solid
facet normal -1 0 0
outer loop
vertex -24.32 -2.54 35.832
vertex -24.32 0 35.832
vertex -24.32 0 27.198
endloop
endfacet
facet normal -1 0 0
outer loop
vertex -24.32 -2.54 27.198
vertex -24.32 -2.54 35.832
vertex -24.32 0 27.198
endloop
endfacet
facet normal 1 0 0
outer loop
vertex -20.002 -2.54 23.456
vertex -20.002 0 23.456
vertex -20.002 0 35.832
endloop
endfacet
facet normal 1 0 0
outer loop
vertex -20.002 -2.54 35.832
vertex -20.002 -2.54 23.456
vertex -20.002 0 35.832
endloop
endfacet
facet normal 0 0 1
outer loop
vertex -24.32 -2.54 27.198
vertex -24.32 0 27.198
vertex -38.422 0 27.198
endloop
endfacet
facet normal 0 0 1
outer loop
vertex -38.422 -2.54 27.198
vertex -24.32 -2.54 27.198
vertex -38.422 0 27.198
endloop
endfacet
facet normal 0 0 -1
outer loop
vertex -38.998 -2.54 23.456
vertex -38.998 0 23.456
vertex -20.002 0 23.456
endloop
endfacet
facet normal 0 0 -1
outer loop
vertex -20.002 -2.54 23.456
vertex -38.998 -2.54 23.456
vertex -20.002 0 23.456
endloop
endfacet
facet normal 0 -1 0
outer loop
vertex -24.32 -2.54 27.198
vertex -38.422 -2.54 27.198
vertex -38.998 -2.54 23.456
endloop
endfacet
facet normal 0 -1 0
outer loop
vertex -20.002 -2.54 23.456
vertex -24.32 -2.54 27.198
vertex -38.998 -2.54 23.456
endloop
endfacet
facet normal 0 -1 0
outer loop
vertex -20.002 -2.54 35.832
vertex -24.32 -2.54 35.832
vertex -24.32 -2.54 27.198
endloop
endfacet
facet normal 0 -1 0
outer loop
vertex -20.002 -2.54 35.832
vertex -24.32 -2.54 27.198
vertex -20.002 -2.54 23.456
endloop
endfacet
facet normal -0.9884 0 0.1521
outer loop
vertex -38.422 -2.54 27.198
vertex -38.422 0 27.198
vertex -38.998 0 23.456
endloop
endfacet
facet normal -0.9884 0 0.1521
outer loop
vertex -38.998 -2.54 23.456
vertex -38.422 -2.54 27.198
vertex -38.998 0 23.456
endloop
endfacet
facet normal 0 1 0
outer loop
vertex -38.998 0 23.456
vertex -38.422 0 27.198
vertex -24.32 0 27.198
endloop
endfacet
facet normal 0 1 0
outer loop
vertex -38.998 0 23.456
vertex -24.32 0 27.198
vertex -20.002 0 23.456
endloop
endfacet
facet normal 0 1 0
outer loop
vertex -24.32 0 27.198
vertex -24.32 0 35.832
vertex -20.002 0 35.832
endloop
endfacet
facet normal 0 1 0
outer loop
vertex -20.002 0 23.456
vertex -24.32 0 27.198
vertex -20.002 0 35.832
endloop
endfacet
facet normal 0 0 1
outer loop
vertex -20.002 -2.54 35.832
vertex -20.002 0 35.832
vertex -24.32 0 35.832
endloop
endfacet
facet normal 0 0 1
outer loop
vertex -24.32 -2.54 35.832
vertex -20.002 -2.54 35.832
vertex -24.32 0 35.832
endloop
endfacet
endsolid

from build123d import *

# Parameters (mm, degrees)
F1_DEPTH = 2.54
F2_R     = 2.6712032827
F3_DEPTH = 2.54


# Not quite as in the source:
# - the program builds the solid bodies; features that only make, move or delete a surface that nothing else refers to are left out


with BuildPart() as f1:
    # F0 (on Front) → F1 (new body)
    with BuildSketch(Plane.XZ):
        Polygon((-38.4220704436, 27.1976441145), (-38.9976799488, 23.4561692923), (-20.0024992228, 23.4561692923), (-20.0024992228, 35.8318164945), (-24.3195872754, 35.8318164945), (-24.3195872754, 31.2269236892), (-24.3195872754, 27.1976441145), align=None)
    extrude(amount=F1_DEPTH)

    # F2 (on Right) → F3 (cut)
    with BuildSketch(Plane.YZ):
        with Locations((0, 48.1319762766)):
            Circle(F2_R)
    extrude(amount=-F3_DEPTH, mode=Mode.SUBTRACT)


solid = f1.part
